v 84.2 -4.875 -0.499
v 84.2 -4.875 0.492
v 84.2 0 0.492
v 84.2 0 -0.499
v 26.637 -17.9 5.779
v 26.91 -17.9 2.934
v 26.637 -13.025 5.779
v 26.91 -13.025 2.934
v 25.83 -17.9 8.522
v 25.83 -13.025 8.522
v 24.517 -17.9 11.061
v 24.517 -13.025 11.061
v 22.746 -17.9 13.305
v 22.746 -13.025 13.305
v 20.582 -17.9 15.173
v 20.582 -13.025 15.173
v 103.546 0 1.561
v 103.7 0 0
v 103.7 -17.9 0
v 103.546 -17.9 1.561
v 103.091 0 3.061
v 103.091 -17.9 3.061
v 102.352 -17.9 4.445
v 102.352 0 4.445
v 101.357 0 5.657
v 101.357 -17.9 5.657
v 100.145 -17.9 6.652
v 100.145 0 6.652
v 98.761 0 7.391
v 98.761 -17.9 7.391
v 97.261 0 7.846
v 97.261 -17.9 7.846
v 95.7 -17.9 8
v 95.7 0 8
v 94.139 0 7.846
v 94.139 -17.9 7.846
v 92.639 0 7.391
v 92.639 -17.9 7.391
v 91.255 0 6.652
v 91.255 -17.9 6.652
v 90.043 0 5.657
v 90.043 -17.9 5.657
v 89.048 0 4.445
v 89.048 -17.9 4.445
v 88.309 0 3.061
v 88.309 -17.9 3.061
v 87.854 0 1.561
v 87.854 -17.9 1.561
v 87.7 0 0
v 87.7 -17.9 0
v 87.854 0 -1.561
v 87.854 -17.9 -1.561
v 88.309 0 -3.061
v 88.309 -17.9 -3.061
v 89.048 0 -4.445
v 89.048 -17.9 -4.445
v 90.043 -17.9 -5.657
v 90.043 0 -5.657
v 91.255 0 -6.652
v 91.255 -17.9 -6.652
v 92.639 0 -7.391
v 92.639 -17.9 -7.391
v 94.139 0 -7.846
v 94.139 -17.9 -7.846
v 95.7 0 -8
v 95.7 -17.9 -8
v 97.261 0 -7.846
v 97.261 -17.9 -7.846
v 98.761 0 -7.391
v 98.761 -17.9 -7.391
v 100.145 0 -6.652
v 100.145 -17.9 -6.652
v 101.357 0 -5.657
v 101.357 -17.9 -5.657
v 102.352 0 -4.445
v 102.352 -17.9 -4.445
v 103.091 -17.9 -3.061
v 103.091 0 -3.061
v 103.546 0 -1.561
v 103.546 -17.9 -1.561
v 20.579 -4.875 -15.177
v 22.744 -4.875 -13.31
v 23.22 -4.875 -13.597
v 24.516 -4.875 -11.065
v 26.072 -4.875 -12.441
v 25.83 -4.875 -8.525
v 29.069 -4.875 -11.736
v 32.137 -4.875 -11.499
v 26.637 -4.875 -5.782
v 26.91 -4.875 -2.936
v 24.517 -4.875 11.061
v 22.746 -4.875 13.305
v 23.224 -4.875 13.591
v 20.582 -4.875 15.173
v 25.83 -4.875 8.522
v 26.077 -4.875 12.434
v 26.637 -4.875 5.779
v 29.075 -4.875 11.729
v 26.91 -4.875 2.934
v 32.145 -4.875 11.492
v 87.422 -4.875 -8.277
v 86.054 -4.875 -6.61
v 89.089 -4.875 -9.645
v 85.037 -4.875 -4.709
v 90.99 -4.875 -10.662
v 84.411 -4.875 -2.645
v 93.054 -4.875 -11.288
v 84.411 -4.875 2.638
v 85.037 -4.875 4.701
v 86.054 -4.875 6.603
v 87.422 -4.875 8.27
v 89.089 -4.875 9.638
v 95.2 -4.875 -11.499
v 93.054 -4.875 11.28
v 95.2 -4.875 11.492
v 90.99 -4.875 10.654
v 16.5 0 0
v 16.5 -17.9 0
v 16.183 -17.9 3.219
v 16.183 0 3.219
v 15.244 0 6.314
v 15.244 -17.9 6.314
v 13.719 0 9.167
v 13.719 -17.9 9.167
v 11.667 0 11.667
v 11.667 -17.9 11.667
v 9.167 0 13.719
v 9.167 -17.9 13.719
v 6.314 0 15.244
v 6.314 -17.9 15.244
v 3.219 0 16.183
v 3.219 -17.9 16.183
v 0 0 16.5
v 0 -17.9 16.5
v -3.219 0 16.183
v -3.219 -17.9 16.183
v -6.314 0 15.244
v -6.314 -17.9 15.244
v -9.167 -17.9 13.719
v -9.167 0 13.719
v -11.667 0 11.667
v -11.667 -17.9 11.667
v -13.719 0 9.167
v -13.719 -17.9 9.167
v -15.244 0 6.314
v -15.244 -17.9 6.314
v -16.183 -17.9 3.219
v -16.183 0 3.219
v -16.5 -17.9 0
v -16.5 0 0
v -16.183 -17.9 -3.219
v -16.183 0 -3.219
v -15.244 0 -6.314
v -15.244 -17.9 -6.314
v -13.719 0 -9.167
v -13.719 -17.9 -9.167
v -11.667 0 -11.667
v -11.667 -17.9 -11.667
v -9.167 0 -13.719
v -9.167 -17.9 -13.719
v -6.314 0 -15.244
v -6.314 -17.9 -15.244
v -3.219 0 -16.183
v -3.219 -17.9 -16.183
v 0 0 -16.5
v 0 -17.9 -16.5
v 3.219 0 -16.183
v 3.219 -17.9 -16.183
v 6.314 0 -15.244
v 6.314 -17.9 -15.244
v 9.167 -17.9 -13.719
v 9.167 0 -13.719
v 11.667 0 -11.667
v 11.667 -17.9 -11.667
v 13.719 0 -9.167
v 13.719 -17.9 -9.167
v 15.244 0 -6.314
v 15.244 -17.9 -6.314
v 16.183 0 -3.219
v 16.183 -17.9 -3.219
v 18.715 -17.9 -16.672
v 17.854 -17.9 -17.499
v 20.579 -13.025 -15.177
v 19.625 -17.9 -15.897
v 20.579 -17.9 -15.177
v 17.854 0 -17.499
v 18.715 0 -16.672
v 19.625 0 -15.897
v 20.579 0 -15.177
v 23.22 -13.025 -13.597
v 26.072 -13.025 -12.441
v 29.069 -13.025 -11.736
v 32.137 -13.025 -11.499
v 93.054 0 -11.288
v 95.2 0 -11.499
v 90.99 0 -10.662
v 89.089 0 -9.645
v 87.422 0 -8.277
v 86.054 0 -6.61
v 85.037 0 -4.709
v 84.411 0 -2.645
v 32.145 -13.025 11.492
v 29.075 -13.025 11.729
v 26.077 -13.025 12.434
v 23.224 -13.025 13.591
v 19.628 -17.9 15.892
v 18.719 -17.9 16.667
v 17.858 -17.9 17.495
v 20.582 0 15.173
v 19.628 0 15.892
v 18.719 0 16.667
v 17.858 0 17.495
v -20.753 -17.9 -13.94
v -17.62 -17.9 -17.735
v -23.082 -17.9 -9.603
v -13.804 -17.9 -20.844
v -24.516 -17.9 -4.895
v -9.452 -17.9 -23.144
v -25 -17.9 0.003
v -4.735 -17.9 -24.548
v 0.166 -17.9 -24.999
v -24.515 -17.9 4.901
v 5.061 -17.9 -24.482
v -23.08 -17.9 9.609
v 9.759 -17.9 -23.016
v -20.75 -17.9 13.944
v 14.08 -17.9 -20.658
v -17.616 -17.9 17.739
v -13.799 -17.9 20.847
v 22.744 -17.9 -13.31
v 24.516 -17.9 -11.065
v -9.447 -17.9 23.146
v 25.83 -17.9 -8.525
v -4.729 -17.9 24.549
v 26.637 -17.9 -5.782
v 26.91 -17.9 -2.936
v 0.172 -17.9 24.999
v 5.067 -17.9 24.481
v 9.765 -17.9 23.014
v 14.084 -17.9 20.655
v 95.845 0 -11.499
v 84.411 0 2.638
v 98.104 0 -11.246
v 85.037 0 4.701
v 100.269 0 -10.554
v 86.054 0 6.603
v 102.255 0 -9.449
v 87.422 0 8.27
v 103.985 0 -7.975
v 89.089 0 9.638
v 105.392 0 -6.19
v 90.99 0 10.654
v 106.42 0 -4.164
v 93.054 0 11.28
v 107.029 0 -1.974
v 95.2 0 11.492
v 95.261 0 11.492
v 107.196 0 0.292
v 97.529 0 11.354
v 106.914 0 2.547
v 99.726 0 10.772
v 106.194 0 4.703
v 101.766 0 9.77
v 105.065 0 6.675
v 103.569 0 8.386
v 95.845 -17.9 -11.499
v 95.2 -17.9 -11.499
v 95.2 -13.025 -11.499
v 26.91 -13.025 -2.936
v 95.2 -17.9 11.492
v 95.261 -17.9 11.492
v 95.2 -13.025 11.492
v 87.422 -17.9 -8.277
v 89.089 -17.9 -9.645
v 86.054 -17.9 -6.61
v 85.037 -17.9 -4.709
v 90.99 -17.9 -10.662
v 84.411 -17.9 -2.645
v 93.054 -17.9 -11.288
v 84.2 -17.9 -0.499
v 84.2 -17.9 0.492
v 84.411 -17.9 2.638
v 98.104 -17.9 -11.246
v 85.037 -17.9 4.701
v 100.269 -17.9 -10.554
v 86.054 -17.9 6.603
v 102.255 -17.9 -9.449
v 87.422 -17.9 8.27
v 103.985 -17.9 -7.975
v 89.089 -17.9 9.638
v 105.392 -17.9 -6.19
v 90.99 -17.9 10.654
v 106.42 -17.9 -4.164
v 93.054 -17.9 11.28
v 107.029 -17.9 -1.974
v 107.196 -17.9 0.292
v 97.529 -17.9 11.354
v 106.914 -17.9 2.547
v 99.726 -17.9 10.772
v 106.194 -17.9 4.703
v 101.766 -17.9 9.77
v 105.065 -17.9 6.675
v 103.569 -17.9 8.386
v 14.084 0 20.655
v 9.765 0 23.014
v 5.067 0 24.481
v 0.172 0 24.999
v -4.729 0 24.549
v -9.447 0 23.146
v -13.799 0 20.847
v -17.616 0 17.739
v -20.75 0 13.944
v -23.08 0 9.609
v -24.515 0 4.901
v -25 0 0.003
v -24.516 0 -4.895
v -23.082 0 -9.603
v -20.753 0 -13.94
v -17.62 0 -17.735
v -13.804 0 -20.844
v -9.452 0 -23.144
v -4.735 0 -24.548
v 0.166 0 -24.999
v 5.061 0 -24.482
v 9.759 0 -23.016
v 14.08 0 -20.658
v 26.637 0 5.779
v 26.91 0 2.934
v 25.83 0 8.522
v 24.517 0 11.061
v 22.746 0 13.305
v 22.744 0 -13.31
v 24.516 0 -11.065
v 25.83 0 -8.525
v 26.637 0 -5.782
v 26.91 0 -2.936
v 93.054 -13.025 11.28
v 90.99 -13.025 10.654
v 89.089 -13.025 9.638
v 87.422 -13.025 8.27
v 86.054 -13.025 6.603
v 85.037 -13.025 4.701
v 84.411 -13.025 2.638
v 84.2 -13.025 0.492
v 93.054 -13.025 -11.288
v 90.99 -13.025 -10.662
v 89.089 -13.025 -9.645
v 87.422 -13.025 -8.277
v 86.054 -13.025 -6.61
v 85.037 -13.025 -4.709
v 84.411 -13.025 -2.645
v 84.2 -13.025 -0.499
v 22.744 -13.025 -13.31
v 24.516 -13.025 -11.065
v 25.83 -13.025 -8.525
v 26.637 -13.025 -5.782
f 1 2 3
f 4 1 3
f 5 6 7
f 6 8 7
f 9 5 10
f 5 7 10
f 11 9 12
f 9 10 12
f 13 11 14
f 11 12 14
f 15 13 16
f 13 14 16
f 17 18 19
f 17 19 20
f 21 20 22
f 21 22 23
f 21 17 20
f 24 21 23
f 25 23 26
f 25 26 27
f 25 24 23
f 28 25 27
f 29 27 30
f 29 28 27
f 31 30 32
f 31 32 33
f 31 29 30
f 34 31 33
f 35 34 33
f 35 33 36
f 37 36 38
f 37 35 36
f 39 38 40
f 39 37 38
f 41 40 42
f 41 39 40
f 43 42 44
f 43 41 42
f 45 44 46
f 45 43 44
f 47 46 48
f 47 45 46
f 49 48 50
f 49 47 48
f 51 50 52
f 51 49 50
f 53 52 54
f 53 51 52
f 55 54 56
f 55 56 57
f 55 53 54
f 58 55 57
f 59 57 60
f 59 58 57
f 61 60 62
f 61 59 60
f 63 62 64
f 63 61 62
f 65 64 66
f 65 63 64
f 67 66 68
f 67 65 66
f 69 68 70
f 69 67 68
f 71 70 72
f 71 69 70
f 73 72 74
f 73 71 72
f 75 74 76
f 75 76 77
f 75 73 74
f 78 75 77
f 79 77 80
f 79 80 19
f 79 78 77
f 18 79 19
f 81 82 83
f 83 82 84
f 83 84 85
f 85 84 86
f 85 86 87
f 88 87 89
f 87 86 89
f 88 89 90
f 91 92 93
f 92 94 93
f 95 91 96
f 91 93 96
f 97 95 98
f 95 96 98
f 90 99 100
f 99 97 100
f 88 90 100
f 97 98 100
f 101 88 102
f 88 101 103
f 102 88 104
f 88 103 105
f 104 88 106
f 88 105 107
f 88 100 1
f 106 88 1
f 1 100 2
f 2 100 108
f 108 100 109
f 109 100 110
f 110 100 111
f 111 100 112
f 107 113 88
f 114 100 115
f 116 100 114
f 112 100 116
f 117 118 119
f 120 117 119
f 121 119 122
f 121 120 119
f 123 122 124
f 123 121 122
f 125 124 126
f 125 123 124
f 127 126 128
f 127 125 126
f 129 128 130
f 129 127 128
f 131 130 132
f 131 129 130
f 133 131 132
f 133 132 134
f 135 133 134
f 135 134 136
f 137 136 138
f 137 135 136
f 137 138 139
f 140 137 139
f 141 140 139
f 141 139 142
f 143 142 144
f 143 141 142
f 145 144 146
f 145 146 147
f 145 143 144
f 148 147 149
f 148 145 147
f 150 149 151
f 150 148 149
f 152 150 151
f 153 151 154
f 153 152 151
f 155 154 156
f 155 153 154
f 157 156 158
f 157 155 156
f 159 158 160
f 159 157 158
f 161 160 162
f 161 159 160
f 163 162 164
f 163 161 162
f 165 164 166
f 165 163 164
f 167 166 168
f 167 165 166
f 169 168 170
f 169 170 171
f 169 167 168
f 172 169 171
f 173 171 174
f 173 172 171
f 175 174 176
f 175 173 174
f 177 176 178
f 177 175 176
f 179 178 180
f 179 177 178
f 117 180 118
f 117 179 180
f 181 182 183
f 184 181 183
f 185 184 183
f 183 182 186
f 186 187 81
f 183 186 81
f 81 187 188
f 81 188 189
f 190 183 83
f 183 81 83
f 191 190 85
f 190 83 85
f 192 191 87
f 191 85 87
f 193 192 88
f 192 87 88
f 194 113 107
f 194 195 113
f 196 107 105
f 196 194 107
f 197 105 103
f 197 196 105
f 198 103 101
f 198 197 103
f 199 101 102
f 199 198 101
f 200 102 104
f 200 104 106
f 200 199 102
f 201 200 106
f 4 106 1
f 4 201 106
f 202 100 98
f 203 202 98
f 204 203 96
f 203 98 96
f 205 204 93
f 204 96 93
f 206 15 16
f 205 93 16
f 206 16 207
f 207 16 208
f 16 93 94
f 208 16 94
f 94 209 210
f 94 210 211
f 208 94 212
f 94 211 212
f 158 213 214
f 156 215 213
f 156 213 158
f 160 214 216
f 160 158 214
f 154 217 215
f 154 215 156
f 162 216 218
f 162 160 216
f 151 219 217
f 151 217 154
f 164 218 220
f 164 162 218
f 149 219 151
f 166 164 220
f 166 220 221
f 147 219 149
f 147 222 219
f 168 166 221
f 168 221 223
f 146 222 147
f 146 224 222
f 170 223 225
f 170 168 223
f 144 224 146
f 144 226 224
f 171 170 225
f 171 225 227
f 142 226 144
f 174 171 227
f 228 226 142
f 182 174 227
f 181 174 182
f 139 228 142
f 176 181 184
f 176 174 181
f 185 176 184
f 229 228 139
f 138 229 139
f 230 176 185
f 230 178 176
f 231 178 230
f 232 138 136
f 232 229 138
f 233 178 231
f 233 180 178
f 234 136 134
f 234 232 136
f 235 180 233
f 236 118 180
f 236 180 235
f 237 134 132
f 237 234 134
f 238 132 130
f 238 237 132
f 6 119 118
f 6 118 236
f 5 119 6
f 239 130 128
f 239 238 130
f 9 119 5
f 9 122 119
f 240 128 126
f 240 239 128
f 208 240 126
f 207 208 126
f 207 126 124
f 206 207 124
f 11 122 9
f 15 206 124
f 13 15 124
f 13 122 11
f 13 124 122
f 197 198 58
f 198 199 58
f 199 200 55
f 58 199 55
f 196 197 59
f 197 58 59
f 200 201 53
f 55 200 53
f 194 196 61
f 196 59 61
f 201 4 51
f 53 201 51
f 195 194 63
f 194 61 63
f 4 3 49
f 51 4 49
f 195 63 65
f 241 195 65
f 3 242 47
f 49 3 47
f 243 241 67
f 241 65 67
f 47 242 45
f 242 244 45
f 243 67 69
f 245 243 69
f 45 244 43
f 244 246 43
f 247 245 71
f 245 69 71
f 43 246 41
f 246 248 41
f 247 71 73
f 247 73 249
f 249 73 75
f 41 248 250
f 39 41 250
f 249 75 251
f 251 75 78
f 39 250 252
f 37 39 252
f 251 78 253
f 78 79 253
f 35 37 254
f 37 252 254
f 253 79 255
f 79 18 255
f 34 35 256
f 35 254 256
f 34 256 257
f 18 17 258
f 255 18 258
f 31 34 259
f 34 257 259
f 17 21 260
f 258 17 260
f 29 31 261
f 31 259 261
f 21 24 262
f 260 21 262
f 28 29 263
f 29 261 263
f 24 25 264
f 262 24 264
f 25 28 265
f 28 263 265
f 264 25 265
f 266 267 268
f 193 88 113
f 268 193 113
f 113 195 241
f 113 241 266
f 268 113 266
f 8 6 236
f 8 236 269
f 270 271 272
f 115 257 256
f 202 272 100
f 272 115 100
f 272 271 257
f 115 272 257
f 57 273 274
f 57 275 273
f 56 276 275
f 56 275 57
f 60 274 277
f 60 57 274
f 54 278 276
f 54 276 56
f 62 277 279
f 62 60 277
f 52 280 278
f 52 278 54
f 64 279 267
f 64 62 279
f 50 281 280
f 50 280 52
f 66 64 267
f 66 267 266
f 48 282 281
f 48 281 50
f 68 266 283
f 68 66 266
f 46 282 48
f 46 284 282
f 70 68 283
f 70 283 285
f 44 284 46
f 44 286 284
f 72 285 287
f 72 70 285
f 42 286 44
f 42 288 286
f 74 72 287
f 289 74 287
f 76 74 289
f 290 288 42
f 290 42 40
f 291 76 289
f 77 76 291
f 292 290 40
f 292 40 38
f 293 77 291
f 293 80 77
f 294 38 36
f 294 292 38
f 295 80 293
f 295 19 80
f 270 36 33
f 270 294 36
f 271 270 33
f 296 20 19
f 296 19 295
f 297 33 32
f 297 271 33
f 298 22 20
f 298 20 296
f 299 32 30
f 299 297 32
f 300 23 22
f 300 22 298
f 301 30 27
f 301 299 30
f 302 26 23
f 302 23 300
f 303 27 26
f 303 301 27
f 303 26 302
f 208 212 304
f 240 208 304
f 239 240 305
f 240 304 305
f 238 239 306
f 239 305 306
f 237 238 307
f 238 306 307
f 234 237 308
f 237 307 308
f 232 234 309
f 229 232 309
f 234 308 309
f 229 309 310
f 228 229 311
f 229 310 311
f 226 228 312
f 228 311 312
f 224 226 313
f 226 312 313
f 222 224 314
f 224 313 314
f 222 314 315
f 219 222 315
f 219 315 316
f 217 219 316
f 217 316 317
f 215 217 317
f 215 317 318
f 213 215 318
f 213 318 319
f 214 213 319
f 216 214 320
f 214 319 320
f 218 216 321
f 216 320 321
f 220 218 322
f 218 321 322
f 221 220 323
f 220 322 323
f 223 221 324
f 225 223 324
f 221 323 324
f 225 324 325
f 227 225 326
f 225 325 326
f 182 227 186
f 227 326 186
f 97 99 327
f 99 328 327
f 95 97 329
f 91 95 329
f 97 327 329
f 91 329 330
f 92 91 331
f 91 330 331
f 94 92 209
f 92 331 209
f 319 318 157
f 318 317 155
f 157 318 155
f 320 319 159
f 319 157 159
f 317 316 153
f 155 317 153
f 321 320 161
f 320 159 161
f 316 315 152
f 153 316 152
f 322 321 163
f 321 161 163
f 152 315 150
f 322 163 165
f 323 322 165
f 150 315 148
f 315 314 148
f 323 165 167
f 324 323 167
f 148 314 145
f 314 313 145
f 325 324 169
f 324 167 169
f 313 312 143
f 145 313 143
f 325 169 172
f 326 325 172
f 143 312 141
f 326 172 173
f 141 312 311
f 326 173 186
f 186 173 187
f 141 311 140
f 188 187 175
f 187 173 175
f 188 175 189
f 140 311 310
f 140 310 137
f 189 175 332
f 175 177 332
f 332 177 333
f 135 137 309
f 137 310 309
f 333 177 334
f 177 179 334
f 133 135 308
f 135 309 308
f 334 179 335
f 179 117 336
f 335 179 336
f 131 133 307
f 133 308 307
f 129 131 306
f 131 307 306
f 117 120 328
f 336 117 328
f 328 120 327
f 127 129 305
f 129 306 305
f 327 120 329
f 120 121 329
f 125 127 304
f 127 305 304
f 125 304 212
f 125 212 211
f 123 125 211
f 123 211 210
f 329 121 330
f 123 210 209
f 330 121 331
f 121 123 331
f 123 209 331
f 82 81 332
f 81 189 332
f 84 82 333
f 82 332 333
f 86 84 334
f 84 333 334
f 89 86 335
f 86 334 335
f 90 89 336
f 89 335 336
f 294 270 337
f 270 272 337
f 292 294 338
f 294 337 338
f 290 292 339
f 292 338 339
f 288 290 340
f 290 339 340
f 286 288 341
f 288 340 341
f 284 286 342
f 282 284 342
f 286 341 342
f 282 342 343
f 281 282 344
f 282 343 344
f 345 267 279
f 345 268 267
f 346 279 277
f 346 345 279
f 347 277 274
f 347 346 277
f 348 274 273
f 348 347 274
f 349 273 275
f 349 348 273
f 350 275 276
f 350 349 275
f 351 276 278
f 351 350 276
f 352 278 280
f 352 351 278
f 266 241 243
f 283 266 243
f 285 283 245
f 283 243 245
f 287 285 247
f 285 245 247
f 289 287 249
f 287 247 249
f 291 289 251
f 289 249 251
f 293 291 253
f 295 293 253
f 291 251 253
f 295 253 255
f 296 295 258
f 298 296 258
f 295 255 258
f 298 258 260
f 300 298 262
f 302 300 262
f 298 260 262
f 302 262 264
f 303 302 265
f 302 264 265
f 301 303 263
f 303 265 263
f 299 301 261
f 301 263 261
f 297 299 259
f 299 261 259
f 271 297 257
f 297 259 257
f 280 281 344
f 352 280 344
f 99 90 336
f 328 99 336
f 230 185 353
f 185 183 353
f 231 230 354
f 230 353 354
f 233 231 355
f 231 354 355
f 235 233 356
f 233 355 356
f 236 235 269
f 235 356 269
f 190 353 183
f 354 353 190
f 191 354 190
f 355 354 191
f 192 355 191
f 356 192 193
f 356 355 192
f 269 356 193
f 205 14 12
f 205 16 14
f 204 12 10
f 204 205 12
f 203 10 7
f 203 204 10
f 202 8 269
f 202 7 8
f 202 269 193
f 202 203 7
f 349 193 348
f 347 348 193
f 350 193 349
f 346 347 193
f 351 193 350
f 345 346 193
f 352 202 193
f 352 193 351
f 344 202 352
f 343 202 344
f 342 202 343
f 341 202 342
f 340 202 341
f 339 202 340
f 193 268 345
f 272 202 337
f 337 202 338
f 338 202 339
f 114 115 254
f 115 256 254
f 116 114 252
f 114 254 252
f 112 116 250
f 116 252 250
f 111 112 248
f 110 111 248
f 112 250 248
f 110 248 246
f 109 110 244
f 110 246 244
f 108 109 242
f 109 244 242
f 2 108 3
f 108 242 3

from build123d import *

# Parameters (mm, degrees)
F0_R          = 16.5
F0_R_2        = 8
F1_DEPTH      = 17.9
F2_W          = 57.2901275009
F2_H          = 11.0436469637
F2_H_2        = 10.7600754127
F3_DEPTH      = 25.001
F3_DEPTH_BACK = 25.001
F4_R          = 11
F5_R          = 11
F6_R          = 11
F7_R          = 15


with BuildPart() as f1:
    # F0 (on Front) → F1 (new body)
    with BuildSketch(Plane.XZ):
        with BuildLine():
            Line((32.137329833, -11.4990798469), (95.5545260385, -11.4990798469))
            Line((95.5545260385, -11.4990798469), (95.8454739615, -11.4990798469))
            ThreePointArc((95.8454739615, -11.4990798469), (107.1962842582, 0.2923153343), (95.2608909699, 11.4916136056))
            Line((95.2608909699, 11.4916136056), (32.1446460941, 11.4916136056))
            ThreePointArc((32.1446460941, 11.4916136056), (24.3962738222, 13.0535354211), (17.858136719, 17.495340892))
            ThreePointArc((17.858136719, 17.495340892), (-24.9999998314, 0.0029037072), (17.8540721294, -17.4994888039))
            ThreePointArc((17.8540721294, -17.4994888039), (24.3910991645, -13.0601018267), (32.137329833, -11.4990798469))
        make_face()
        Circle(F0_R, mode=Mode.SUBTRACT)
        with Locations((95.7, 0)):
            Circle(F0_R_2, mode=Mode.SUBTRACT)
    extrude(amount=F1_DEPTH)

    # F2 (on Top) → F3 (cut, two sides)
    with BuildSketch(Plane.XY) as f3_sk:
        with Locations((55.5549362496, 0.6468234818)):
            Rectangle(F2_W, F2_H)
        with Locations((55.5549362496, -18.4050377063)):
            Rectangle(F2_W, F2_H_2)
    extrude(amount=-F3_DEPTH, mode=Mode.SUBTRACT)
    extrude(f3_sk.sketch, amount=F3_DEPTH_BACK, mode=Mode.SUBTRACT)

    # F4
    f4_edges = [f1.edges().sort_by_distance(p)[0] for p in [
        (84.2, -2.4375, -11.49908),
    ]]
    fillet(f4_edges, radius=F4_R)

    # F5
    f5_edges = [f1.edges().sort_by_distance(p)[0] for p in [
        (84.2, -2.4375, 11.491614),
    ]]
    fillet(f5_edges, radius=F5_R)

    # F6
    f6_edges = [f1.edges().sort_by_distance(p)[0] for p in [
        (84.2, -15.4625, -11.49908),
        (84.2, -15.4625, 11.491614),
    ]]
    fillet(f6_edges, radius=F6_R)

    # F7
    f7_edges = [f1.edges().sort_by_distance(p)[0] for p in [
        (26.909872, -2.4375, -12.194322),
        (26.909872, -2.4375, 12.188838),
        (26.909872, -15.4625, -12.194322),
        (26.909872, -15.4625, 12.188838),
    ]]
    fillet(f7_edges, radius=F7_R)


solid = f1.part
